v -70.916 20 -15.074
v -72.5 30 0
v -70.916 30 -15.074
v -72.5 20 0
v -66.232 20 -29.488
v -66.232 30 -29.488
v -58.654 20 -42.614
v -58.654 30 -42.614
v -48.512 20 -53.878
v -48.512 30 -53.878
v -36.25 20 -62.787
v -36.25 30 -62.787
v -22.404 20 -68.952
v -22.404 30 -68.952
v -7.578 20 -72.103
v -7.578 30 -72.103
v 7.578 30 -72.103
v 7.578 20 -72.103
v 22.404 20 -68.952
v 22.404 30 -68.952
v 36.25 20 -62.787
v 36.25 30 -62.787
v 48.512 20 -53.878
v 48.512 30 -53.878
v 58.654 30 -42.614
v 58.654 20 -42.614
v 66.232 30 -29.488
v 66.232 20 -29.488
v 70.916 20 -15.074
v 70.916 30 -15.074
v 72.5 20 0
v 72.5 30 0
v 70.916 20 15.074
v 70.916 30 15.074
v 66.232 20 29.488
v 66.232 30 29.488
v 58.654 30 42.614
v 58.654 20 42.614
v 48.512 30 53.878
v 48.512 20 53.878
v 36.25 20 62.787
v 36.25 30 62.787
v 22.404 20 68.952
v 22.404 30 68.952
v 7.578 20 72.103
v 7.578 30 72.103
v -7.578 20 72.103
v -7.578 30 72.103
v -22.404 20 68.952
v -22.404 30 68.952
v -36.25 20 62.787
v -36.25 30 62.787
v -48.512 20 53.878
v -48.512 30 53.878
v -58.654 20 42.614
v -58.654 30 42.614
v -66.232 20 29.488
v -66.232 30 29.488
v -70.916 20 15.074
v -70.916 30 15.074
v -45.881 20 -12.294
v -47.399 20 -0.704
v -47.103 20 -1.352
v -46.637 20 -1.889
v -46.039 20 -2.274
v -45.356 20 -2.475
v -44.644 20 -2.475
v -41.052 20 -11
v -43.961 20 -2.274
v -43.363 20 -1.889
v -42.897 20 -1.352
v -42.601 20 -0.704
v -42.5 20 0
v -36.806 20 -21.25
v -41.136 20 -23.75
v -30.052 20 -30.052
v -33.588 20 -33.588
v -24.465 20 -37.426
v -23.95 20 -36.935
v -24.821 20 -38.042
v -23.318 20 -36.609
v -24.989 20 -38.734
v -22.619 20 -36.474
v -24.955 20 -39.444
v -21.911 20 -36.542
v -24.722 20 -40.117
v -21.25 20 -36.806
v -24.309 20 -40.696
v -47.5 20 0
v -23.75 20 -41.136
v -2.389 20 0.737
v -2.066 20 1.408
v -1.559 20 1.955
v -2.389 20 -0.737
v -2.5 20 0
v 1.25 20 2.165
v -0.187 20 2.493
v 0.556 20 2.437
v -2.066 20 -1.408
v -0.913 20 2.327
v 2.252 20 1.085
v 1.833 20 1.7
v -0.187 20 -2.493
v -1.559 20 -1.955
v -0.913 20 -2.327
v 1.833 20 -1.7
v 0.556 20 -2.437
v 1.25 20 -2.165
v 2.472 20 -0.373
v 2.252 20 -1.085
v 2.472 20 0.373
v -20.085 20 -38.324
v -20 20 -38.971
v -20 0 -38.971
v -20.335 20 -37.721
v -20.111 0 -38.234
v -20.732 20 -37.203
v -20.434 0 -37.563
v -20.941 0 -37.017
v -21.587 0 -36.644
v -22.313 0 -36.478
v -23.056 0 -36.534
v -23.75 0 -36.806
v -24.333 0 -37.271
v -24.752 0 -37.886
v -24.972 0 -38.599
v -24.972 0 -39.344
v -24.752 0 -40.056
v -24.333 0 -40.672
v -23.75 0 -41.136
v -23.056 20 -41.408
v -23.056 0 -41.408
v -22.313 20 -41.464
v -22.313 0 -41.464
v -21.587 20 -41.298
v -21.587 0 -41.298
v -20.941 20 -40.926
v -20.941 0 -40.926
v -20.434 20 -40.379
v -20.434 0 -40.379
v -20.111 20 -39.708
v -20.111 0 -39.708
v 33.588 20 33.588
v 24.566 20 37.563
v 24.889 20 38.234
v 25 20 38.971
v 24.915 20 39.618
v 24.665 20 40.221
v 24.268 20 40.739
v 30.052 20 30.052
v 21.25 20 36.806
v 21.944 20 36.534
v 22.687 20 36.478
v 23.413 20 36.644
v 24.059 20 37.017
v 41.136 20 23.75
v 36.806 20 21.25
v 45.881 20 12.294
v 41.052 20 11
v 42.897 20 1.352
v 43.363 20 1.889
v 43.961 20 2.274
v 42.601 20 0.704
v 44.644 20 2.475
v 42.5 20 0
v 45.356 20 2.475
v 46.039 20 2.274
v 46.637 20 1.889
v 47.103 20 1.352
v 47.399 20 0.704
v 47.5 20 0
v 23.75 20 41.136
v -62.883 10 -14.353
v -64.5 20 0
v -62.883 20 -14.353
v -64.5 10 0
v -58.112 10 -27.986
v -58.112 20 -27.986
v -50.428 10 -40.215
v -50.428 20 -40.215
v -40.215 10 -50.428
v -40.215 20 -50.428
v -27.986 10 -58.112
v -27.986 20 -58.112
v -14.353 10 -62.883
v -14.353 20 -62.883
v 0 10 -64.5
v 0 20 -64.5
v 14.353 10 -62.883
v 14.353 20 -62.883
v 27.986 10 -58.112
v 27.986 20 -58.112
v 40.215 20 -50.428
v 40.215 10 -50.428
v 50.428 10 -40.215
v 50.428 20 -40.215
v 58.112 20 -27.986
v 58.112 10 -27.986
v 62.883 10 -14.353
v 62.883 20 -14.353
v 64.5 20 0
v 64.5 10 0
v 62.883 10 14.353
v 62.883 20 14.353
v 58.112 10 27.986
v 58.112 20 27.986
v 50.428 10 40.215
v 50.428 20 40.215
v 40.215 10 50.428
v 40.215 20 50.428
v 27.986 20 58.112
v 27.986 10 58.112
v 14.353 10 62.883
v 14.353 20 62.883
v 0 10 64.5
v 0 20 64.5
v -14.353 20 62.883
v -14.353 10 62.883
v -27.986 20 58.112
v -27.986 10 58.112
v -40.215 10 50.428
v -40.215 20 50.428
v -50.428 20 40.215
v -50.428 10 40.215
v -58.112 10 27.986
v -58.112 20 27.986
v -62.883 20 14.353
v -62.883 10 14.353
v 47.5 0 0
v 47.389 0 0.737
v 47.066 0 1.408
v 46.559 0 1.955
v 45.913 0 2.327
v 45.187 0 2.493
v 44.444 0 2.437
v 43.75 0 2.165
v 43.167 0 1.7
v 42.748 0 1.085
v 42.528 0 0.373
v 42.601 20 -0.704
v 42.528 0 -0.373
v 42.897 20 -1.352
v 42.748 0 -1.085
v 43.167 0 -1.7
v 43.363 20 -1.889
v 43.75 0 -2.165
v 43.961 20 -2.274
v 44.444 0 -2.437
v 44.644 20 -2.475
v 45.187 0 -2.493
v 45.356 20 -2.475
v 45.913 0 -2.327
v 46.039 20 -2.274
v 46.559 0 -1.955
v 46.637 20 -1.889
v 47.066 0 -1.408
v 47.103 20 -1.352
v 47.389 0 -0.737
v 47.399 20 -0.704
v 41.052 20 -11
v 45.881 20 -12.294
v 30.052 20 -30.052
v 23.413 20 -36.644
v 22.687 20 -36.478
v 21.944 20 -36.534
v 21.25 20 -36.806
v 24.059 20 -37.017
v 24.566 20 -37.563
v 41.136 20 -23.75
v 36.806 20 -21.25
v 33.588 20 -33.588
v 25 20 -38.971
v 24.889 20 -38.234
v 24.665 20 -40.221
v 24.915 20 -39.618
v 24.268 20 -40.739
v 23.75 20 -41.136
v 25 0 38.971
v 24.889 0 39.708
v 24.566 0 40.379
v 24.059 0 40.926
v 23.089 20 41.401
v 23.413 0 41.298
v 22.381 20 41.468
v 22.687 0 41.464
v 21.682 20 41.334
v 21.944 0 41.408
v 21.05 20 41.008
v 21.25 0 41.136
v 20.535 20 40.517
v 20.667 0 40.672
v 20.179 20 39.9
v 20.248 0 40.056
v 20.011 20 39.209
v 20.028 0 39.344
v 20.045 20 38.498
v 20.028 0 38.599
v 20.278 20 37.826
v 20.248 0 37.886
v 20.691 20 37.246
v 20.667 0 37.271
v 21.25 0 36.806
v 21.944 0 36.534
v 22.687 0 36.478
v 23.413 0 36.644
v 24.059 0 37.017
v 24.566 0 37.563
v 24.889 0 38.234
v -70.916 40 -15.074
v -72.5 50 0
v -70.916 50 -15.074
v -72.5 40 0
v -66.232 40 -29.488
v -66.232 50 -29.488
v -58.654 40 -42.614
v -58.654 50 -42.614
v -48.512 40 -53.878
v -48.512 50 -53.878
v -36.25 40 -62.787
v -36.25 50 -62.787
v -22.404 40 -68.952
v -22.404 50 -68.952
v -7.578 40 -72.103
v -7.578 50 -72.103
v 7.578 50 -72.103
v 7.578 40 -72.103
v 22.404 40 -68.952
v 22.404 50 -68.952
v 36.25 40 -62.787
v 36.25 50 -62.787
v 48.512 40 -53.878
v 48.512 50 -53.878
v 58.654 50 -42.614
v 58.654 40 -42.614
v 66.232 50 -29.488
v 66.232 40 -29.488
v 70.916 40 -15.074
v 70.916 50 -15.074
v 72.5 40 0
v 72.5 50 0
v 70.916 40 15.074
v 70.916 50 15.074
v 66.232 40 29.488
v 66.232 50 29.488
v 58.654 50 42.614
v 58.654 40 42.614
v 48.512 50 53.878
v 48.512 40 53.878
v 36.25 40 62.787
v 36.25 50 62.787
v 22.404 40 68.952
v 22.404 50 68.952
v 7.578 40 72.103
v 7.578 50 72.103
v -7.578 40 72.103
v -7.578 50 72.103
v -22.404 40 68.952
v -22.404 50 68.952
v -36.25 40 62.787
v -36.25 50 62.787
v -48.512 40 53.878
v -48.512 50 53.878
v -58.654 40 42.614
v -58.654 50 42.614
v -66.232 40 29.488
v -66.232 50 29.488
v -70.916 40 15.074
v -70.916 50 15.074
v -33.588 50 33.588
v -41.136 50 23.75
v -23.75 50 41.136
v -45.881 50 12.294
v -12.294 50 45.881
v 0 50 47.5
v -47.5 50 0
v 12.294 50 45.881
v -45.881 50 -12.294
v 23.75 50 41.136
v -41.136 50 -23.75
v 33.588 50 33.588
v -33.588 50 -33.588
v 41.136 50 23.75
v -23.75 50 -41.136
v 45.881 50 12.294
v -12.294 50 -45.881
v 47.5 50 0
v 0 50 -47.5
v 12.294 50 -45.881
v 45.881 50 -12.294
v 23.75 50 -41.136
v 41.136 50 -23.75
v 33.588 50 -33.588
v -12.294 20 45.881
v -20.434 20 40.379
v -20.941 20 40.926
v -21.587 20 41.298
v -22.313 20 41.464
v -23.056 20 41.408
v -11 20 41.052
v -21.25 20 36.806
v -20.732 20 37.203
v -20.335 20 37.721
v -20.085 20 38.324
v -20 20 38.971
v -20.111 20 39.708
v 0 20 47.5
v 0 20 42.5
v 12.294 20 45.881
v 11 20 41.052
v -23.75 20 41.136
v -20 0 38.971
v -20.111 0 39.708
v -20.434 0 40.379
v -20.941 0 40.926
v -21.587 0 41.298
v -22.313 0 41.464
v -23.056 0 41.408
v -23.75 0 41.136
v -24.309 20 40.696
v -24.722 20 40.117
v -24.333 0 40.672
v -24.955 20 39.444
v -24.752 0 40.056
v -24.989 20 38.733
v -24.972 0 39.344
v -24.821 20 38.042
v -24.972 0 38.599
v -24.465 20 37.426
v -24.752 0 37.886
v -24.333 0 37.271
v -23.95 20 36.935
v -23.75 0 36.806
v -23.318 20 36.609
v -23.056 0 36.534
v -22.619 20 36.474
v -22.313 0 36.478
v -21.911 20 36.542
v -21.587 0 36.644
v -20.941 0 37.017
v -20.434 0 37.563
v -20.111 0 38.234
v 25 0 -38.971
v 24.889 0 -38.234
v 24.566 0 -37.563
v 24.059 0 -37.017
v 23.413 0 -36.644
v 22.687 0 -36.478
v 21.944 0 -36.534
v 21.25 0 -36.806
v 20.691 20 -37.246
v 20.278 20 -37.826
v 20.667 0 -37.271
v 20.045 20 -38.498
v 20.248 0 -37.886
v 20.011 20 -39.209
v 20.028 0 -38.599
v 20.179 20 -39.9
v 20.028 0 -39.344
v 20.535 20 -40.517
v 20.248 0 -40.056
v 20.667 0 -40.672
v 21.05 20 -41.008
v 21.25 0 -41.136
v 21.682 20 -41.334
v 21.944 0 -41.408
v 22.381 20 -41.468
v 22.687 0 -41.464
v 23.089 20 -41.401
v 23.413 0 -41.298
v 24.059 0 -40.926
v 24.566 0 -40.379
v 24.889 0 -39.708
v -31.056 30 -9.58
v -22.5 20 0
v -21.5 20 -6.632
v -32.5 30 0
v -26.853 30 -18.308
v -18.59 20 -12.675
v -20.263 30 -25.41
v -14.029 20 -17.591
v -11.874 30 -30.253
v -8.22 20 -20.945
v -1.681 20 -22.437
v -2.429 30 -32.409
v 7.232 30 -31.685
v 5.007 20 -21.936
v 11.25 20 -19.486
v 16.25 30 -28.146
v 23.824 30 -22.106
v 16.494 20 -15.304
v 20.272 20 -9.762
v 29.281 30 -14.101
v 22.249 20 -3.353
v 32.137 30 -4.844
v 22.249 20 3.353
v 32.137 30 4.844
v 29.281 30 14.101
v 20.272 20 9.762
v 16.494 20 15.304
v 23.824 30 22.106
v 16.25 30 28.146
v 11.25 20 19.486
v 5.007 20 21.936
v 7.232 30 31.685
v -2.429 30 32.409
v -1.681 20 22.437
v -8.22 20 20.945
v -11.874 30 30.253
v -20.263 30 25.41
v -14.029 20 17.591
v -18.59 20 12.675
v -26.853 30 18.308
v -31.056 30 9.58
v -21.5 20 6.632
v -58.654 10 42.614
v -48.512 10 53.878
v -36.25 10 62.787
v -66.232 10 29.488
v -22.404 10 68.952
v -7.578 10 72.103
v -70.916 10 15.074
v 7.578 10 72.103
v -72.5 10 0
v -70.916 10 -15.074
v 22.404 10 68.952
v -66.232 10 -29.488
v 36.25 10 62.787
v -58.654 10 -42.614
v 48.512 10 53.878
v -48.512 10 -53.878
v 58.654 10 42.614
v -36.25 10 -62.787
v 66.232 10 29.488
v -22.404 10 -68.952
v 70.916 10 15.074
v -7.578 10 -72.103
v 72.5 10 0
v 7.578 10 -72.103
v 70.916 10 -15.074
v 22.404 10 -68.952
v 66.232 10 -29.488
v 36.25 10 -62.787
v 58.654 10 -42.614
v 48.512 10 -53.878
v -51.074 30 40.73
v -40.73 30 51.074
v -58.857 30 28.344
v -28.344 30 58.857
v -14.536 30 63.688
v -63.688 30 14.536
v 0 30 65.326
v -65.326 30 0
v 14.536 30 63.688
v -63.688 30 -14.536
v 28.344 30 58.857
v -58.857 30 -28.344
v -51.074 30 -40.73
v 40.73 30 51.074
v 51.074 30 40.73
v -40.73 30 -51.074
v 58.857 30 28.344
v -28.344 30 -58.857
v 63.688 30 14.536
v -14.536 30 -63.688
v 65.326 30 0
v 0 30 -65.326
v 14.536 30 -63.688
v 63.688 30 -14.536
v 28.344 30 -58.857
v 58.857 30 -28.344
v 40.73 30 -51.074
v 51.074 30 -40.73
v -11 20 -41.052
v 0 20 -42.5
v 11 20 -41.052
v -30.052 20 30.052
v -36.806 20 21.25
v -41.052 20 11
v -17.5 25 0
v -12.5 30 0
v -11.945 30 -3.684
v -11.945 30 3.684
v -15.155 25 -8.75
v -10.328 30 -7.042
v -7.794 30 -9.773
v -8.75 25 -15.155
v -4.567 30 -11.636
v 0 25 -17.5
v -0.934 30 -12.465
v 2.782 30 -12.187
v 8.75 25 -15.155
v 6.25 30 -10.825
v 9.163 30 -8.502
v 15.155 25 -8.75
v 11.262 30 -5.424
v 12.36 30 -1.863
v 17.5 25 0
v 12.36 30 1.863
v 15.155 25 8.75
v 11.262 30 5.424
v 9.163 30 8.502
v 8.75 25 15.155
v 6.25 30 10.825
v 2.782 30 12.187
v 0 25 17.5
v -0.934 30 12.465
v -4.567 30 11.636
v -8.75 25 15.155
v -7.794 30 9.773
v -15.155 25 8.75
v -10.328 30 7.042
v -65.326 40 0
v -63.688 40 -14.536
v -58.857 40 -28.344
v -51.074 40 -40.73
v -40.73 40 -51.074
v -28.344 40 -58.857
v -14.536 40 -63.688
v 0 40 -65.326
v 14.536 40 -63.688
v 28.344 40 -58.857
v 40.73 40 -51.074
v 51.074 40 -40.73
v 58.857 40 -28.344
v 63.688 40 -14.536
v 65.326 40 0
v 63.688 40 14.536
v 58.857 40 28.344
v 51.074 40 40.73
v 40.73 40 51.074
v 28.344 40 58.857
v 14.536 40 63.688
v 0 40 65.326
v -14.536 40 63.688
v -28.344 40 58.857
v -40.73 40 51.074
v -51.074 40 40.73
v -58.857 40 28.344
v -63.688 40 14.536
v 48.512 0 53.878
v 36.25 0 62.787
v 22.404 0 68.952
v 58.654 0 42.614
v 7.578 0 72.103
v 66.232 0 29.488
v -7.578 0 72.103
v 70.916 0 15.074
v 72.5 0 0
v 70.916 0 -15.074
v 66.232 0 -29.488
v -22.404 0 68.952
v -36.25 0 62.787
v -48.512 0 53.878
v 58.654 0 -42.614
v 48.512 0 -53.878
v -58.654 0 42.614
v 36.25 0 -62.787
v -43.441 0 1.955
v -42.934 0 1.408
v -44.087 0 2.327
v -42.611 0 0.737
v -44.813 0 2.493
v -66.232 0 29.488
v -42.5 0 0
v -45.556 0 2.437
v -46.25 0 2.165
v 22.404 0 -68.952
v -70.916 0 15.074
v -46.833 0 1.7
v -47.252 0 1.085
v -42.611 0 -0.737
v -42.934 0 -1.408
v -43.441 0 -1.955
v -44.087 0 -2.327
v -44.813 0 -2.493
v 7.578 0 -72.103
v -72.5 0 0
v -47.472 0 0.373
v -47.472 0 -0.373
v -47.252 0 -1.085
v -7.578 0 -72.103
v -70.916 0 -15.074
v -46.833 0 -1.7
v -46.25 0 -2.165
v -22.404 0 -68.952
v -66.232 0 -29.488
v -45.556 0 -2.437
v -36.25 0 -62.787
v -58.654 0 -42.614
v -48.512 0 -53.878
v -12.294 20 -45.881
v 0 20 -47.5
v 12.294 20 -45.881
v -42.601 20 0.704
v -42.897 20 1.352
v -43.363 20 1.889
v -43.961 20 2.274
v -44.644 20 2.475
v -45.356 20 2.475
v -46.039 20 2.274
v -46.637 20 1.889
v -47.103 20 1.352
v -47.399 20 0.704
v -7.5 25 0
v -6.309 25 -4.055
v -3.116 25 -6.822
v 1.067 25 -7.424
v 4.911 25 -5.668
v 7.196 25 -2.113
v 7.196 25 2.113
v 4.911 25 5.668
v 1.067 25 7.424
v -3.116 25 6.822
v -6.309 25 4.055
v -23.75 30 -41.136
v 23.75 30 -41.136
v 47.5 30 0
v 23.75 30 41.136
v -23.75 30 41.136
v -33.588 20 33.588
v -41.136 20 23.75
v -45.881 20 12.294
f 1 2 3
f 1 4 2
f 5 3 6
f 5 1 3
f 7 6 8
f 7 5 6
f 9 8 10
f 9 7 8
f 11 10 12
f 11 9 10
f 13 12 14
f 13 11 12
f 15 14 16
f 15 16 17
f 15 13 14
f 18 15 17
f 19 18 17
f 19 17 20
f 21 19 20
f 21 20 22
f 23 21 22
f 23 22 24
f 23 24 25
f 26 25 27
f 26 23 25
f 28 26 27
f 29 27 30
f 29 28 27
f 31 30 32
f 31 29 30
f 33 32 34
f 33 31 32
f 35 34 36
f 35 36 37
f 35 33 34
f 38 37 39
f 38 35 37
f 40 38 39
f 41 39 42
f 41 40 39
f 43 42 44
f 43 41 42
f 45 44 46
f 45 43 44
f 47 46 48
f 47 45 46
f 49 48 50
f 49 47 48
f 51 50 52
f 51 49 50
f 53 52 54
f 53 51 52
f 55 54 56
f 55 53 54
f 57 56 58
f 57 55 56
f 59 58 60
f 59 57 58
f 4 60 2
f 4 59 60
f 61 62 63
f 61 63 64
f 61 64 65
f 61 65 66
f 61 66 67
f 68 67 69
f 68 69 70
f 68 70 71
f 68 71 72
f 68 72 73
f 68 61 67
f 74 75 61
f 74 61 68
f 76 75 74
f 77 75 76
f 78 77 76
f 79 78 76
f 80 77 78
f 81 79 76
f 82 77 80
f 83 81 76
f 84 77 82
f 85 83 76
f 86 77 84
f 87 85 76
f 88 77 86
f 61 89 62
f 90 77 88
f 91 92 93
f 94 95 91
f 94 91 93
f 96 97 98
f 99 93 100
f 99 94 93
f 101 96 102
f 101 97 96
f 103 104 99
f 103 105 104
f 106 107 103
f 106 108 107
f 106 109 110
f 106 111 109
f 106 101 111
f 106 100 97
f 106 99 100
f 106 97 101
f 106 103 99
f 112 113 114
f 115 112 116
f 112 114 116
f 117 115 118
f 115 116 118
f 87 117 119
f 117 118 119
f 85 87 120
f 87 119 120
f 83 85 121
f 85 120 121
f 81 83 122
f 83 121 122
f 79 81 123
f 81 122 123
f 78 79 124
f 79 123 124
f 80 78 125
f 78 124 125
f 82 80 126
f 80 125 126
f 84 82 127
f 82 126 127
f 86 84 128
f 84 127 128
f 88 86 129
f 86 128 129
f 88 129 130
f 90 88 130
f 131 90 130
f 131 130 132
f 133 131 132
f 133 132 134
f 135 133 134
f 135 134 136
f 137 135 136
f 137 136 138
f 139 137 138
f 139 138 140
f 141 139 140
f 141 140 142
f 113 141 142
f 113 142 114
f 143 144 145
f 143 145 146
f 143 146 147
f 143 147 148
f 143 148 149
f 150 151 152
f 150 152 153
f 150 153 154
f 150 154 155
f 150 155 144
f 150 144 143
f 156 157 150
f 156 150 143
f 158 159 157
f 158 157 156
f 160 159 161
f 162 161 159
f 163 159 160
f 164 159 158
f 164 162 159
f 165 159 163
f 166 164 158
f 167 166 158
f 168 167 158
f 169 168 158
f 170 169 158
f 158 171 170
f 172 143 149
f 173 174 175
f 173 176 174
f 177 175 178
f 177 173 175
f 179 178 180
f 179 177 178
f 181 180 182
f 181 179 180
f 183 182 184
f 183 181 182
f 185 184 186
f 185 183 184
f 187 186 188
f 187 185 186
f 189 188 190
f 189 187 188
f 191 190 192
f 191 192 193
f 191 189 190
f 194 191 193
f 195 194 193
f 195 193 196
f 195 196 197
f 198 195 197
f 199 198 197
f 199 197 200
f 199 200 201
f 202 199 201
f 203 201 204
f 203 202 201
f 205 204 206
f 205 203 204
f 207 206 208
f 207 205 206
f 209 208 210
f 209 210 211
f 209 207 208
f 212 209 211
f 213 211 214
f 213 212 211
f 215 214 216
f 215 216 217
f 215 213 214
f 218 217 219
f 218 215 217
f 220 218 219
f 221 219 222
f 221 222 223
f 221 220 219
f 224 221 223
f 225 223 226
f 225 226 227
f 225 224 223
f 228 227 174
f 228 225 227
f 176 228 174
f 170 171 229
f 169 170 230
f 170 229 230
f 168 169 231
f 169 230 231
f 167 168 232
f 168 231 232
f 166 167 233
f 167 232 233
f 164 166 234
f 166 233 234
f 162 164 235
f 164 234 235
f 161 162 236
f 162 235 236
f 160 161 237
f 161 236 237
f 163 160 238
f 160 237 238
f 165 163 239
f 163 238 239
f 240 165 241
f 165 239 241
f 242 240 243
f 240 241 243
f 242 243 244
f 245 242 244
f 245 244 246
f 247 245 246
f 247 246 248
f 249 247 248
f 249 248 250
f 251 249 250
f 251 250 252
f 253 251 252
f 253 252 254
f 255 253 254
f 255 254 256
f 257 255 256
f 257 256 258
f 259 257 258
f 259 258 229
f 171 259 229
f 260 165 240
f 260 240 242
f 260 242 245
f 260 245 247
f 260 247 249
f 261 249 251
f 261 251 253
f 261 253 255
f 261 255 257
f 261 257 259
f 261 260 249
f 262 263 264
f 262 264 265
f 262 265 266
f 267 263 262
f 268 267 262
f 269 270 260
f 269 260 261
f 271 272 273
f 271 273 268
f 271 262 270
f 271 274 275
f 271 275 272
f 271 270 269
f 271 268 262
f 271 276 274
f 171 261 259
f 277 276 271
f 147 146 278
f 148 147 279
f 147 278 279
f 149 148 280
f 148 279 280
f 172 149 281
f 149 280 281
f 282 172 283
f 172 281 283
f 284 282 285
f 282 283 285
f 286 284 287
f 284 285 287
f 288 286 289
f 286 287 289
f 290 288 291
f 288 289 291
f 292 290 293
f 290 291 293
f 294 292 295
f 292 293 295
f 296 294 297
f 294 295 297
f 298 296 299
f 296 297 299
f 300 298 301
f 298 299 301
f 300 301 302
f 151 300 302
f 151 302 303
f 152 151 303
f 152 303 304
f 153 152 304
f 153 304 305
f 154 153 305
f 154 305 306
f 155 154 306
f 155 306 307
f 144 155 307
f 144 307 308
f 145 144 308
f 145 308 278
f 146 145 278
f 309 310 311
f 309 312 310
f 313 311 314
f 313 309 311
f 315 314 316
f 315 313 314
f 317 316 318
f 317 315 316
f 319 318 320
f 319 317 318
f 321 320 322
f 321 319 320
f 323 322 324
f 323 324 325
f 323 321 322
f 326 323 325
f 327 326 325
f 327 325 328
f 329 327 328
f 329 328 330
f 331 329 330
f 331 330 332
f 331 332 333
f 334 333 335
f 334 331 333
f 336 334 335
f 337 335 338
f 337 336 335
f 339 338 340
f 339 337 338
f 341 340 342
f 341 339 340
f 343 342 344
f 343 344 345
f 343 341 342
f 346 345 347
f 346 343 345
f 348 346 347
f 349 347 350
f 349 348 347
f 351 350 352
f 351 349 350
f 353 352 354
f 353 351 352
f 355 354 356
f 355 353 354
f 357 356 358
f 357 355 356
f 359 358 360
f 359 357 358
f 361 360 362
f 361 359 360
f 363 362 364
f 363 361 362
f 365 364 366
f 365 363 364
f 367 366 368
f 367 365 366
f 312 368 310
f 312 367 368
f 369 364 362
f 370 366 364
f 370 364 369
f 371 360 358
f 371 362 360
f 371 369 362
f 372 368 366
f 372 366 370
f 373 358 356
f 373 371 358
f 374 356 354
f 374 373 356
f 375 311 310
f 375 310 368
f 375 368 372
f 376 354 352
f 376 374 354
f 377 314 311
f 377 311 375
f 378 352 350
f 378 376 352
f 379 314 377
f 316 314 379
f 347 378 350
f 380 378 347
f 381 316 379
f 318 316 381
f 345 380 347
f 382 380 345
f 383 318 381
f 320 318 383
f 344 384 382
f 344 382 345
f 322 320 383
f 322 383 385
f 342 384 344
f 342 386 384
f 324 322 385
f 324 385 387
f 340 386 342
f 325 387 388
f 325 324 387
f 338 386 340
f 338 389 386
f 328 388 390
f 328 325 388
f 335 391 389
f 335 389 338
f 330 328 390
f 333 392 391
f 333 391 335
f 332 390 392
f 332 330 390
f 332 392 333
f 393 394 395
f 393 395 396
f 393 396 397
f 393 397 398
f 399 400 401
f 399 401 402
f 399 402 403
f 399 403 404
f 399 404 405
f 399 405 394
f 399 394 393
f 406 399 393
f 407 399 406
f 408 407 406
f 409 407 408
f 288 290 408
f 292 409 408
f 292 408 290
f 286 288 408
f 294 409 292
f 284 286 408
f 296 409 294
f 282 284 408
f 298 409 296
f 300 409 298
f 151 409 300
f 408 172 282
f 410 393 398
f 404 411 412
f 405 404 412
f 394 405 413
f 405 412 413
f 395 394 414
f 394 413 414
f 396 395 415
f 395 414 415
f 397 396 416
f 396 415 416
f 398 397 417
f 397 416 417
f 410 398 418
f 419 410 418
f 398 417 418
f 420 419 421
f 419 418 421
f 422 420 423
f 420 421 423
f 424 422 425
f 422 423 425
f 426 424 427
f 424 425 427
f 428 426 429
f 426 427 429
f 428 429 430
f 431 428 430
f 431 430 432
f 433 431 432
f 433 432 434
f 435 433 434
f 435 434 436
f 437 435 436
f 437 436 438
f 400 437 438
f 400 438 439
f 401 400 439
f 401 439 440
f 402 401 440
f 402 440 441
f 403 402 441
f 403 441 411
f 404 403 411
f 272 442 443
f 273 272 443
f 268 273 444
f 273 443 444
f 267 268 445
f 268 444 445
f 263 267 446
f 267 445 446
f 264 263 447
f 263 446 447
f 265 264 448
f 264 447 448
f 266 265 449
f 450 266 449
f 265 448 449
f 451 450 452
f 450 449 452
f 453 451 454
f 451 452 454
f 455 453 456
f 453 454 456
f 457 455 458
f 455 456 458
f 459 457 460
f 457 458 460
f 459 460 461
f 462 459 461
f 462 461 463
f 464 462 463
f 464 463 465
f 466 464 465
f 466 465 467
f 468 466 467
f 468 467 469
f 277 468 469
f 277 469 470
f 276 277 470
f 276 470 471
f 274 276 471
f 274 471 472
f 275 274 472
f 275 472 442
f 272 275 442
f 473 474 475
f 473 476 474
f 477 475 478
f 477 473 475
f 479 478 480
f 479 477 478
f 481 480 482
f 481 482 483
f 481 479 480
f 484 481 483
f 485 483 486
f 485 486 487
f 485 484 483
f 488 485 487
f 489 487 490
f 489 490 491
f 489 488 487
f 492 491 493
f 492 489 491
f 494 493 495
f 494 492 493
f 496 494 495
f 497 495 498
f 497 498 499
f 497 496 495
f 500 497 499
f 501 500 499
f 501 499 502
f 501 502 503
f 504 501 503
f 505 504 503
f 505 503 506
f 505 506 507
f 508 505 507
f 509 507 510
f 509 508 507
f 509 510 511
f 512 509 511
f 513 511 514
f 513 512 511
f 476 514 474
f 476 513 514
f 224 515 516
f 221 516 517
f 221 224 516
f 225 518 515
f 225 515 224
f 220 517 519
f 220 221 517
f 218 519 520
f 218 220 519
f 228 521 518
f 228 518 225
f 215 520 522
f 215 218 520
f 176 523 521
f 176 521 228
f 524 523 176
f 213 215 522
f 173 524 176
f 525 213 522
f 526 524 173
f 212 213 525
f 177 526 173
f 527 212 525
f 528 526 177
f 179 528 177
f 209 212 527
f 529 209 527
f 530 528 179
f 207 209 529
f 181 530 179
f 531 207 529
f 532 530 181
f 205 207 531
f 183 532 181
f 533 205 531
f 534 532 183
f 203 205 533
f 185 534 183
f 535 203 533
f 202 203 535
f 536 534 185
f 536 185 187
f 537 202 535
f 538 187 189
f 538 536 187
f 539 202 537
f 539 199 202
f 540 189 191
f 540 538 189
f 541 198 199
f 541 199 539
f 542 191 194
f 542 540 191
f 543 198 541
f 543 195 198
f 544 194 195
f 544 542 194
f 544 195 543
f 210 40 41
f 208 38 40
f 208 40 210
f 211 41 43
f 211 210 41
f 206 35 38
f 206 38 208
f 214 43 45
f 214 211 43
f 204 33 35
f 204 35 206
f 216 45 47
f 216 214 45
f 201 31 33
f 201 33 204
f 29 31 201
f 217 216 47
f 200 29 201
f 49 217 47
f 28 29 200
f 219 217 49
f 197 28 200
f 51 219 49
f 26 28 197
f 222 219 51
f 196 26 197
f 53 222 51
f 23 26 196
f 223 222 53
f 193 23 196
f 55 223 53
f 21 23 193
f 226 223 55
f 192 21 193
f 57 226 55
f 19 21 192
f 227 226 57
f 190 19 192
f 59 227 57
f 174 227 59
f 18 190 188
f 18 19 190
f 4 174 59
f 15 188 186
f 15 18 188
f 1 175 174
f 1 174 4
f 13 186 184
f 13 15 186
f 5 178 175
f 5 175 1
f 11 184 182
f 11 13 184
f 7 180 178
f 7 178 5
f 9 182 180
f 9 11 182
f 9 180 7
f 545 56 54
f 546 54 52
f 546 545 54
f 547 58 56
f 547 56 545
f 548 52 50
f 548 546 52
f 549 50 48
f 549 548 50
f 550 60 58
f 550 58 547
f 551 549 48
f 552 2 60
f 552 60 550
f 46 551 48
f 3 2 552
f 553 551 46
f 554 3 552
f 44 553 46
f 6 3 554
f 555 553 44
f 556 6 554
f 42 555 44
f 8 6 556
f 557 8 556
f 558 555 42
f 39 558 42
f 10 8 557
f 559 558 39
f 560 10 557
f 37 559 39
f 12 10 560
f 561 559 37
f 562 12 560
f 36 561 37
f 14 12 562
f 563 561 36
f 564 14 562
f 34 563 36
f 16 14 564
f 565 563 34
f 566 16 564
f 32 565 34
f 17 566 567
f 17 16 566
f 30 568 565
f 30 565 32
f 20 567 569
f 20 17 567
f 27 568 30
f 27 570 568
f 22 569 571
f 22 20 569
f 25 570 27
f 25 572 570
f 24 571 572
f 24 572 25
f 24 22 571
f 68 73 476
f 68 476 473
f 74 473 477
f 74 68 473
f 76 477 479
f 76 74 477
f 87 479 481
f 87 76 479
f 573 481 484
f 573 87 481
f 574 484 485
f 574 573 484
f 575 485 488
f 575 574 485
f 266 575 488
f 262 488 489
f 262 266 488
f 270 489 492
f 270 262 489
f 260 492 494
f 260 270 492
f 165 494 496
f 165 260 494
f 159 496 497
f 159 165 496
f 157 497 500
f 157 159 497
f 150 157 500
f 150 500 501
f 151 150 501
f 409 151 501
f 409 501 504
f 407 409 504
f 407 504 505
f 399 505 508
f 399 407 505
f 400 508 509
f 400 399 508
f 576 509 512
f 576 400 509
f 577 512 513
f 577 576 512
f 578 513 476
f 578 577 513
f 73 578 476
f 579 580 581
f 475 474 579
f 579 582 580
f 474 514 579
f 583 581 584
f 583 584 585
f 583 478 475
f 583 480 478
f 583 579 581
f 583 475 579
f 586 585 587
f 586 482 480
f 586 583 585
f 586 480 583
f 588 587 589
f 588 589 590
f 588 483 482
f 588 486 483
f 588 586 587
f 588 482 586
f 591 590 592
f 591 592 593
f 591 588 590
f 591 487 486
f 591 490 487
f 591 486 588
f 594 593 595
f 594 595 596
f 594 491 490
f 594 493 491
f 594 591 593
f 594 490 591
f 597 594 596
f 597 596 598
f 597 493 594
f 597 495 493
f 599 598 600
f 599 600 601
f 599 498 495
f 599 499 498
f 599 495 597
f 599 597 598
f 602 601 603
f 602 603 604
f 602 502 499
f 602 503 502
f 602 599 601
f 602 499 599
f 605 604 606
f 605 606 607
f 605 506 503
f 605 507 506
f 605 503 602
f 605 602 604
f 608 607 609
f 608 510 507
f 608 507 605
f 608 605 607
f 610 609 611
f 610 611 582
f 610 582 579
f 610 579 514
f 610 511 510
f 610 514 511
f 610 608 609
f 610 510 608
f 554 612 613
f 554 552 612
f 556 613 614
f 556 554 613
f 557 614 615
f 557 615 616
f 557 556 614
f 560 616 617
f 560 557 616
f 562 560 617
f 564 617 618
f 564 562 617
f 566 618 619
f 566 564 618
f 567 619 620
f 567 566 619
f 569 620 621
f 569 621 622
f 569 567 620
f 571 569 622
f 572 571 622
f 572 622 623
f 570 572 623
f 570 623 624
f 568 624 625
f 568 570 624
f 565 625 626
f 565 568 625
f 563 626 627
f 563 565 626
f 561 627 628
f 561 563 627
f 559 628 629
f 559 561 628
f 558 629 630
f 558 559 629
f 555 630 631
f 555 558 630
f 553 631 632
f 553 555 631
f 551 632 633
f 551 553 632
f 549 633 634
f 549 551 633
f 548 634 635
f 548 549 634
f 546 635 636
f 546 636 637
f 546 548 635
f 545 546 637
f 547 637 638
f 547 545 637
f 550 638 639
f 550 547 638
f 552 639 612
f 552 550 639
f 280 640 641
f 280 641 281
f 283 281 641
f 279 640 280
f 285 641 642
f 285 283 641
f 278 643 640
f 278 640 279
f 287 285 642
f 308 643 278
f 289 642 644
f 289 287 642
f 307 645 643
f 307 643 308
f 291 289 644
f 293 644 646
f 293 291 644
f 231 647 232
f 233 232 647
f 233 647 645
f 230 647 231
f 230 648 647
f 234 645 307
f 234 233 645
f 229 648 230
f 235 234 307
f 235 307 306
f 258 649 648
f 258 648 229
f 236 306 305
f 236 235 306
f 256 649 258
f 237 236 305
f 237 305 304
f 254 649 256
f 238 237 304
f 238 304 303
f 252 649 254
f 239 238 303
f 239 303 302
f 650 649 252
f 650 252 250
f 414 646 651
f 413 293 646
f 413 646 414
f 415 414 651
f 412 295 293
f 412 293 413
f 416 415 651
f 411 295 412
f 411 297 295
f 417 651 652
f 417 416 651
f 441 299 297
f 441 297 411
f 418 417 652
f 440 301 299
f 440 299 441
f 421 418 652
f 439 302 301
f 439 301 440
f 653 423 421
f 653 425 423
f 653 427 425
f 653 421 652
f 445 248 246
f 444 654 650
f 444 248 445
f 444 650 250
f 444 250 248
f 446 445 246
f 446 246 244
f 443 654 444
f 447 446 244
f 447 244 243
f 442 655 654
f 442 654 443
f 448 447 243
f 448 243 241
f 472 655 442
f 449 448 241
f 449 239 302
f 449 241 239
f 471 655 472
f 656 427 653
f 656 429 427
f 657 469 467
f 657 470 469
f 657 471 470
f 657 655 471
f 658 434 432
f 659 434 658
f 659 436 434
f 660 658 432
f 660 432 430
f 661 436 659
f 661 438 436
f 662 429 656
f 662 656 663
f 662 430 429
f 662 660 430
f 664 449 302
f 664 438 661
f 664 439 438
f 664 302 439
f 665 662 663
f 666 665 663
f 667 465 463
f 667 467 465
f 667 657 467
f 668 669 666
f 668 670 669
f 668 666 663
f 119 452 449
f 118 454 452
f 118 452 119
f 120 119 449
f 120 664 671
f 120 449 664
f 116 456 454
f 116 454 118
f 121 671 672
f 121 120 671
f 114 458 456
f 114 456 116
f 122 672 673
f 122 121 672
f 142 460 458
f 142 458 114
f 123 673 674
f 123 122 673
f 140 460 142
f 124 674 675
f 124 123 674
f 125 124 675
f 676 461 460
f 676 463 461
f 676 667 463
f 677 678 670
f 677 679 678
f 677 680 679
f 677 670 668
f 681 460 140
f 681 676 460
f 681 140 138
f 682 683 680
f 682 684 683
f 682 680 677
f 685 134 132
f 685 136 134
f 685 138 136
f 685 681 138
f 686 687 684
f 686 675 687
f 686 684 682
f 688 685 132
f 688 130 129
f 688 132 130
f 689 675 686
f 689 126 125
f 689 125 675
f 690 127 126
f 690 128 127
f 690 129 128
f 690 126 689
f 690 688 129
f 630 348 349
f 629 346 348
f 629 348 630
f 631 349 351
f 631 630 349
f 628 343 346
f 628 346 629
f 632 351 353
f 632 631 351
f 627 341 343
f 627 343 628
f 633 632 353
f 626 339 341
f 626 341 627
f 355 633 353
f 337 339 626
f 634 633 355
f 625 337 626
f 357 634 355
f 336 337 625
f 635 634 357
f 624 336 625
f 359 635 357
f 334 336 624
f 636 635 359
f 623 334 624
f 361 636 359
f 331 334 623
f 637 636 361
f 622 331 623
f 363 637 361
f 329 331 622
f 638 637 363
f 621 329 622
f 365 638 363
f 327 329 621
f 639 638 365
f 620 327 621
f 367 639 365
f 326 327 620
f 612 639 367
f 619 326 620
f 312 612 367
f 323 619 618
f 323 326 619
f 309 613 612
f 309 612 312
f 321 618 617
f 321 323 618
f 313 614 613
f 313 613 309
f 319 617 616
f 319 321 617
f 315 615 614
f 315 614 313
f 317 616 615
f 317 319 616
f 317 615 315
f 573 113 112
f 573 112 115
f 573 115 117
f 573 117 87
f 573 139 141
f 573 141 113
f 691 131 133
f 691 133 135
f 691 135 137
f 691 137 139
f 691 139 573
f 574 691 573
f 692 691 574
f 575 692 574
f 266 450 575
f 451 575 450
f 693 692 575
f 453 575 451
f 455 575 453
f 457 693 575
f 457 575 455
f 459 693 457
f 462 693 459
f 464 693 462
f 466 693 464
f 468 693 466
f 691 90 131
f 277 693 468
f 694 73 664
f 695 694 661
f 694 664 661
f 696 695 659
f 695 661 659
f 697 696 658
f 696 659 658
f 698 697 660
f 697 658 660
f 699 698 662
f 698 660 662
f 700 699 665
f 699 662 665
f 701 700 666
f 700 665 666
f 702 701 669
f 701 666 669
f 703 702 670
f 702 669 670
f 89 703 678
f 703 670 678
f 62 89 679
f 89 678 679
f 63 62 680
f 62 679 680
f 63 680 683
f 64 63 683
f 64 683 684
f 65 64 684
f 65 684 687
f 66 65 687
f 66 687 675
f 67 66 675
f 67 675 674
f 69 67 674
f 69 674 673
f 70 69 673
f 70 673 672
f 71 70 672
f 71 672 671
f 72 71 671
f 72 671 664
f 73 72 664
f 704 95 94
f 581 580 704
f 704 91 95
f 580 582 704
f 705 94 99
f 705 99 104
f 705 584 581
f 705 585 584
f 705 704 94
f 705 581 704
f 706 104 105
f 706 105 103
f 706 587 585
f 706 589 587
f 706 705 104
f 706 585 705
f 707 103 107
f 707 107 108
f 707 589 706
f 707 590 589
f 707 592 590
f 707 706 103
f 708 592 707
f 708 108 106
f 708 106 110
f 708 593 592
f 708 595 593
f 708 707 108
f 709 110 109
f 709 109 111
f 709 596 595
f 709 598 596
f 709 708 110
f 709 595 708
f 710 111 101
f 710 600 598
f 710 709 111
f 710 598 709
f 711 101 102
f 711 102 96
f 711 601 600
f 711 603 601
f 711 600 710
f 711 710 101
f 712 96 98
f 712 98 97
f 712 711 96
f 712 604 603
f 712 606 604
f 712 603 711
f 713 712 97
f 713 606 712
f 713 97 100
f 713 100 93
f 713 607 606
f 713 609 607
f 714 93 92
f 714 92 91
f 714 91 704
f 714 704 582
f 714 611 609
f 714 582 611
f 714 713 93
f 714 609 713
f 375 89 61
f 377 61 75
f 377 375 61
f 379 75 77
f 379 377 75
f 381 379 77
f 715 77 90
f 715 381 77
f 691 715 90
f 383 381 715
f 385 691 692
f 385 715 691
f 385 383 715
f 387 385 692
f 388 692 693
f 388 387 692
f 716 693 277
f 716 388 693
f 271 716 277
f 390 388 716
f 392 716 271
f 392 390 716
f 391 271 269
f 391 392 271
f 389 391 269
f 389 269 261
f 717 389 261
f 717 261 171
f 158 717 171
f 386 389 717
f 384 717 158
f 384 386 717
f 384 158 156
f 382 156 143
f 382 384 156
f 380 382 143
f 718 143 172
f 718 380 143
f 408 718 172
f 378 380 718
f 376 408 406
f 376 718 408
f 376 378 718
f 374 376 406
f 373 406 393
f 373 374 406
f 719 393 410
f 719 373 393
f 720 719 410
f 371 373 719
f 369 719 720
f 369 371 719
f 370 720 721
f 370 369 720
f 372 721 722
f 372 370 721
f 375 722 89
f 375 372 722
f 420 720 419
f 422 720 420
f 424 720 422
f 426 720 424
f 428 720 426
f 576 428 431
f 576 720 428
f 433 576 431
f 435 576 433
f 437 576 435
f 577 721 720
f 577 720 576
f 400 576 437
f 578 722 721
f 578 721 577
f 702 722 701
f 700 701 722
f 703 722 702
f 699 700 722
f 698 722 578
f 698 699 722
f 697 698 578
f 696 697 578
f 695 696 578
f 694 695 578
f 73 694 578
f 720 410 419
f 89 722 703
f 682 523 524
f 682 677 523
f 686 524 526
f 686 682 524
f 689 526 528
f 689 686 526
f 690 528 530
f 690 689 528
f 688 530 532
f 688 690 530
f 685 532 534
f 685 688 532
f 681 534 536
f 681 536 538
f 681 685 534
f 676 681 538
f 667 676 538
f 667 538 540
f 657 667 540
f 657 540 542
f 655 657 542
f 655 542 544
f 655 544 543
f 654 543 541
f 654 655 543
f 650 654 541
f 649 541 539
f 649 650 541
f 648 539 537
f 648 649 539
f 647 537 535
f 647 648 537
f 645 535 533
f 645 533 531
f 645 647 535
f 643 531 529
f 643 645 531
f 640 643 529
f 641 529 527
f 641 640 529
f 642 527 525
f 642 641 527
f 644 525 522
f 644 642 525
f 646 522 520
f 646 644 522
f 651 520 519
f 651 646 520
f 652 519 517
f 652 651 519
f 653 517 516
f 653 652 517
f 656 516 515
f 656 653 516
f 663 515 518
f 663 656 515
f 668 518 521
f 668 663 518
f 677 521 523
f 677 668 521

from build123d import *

# Parameters (mm, degrees)
SKETCH2_R          = 2.5
CUT_EXTRUDE1_DEPTH = 30


with BuildPart() as part:
    # Sketch1 → Revolve1 (revolve)
    with BuildSketch(Plane.XY):
        Polygon((-72.5, 0), (0, 0), (0, 20), (-2.5, 20), (-12.5, 30), (-22.5, 20), (-32.5, 30), (-42.5, 20), (-47.5, 20), (-47.5, 50), (-72.5, 50), (-72.5, 40), (-65.326285386, 40), (-65.326285386, 30), (-72.5, 30), (-72.5, 20), (-64.5, 20), (-64.5, 10), (-72.5, 10), align=None)
    revolve(axis=Axis((0, 20, 0), (0, -1, 0)))

    # Sketch2 → Cut-Extrude1 (cut)
    with BuildSketch(Plane.XZ):
        with BuildLine():
            ThreePointArc((-47.5, 0), (-45, -2.5), (-42.5, 0))
            Line((-42.5, 0), (-47.5, 0))
        make_face()
        with BuildLine():
            Line((-47.5, 0), (-42.5, 0))
            ThreePointArc((-42.5, 0), (-45, 2.5), (-47.5, 0))
        make_face()
        with Locations((-22.5, -38.97114317)):
            Circle(SKETCH2_R)
        with Locations((-22.5, 38.97114317)):
            Circle(SKETCH2_R)
        with Locations((22.5, 38.97114317)):
            Circle(SKETCH2_R)
        with Locations((45, 0)):
            Circle(SKETCH2_R)
        with Locations((22.5, -38.97114317)):
            Circle(SKETCH2_R)
    extrude(amount=-CUT_EXTRUDE1_DEPTH, mode=Mode.SUBTRACT)


solid = part.part
